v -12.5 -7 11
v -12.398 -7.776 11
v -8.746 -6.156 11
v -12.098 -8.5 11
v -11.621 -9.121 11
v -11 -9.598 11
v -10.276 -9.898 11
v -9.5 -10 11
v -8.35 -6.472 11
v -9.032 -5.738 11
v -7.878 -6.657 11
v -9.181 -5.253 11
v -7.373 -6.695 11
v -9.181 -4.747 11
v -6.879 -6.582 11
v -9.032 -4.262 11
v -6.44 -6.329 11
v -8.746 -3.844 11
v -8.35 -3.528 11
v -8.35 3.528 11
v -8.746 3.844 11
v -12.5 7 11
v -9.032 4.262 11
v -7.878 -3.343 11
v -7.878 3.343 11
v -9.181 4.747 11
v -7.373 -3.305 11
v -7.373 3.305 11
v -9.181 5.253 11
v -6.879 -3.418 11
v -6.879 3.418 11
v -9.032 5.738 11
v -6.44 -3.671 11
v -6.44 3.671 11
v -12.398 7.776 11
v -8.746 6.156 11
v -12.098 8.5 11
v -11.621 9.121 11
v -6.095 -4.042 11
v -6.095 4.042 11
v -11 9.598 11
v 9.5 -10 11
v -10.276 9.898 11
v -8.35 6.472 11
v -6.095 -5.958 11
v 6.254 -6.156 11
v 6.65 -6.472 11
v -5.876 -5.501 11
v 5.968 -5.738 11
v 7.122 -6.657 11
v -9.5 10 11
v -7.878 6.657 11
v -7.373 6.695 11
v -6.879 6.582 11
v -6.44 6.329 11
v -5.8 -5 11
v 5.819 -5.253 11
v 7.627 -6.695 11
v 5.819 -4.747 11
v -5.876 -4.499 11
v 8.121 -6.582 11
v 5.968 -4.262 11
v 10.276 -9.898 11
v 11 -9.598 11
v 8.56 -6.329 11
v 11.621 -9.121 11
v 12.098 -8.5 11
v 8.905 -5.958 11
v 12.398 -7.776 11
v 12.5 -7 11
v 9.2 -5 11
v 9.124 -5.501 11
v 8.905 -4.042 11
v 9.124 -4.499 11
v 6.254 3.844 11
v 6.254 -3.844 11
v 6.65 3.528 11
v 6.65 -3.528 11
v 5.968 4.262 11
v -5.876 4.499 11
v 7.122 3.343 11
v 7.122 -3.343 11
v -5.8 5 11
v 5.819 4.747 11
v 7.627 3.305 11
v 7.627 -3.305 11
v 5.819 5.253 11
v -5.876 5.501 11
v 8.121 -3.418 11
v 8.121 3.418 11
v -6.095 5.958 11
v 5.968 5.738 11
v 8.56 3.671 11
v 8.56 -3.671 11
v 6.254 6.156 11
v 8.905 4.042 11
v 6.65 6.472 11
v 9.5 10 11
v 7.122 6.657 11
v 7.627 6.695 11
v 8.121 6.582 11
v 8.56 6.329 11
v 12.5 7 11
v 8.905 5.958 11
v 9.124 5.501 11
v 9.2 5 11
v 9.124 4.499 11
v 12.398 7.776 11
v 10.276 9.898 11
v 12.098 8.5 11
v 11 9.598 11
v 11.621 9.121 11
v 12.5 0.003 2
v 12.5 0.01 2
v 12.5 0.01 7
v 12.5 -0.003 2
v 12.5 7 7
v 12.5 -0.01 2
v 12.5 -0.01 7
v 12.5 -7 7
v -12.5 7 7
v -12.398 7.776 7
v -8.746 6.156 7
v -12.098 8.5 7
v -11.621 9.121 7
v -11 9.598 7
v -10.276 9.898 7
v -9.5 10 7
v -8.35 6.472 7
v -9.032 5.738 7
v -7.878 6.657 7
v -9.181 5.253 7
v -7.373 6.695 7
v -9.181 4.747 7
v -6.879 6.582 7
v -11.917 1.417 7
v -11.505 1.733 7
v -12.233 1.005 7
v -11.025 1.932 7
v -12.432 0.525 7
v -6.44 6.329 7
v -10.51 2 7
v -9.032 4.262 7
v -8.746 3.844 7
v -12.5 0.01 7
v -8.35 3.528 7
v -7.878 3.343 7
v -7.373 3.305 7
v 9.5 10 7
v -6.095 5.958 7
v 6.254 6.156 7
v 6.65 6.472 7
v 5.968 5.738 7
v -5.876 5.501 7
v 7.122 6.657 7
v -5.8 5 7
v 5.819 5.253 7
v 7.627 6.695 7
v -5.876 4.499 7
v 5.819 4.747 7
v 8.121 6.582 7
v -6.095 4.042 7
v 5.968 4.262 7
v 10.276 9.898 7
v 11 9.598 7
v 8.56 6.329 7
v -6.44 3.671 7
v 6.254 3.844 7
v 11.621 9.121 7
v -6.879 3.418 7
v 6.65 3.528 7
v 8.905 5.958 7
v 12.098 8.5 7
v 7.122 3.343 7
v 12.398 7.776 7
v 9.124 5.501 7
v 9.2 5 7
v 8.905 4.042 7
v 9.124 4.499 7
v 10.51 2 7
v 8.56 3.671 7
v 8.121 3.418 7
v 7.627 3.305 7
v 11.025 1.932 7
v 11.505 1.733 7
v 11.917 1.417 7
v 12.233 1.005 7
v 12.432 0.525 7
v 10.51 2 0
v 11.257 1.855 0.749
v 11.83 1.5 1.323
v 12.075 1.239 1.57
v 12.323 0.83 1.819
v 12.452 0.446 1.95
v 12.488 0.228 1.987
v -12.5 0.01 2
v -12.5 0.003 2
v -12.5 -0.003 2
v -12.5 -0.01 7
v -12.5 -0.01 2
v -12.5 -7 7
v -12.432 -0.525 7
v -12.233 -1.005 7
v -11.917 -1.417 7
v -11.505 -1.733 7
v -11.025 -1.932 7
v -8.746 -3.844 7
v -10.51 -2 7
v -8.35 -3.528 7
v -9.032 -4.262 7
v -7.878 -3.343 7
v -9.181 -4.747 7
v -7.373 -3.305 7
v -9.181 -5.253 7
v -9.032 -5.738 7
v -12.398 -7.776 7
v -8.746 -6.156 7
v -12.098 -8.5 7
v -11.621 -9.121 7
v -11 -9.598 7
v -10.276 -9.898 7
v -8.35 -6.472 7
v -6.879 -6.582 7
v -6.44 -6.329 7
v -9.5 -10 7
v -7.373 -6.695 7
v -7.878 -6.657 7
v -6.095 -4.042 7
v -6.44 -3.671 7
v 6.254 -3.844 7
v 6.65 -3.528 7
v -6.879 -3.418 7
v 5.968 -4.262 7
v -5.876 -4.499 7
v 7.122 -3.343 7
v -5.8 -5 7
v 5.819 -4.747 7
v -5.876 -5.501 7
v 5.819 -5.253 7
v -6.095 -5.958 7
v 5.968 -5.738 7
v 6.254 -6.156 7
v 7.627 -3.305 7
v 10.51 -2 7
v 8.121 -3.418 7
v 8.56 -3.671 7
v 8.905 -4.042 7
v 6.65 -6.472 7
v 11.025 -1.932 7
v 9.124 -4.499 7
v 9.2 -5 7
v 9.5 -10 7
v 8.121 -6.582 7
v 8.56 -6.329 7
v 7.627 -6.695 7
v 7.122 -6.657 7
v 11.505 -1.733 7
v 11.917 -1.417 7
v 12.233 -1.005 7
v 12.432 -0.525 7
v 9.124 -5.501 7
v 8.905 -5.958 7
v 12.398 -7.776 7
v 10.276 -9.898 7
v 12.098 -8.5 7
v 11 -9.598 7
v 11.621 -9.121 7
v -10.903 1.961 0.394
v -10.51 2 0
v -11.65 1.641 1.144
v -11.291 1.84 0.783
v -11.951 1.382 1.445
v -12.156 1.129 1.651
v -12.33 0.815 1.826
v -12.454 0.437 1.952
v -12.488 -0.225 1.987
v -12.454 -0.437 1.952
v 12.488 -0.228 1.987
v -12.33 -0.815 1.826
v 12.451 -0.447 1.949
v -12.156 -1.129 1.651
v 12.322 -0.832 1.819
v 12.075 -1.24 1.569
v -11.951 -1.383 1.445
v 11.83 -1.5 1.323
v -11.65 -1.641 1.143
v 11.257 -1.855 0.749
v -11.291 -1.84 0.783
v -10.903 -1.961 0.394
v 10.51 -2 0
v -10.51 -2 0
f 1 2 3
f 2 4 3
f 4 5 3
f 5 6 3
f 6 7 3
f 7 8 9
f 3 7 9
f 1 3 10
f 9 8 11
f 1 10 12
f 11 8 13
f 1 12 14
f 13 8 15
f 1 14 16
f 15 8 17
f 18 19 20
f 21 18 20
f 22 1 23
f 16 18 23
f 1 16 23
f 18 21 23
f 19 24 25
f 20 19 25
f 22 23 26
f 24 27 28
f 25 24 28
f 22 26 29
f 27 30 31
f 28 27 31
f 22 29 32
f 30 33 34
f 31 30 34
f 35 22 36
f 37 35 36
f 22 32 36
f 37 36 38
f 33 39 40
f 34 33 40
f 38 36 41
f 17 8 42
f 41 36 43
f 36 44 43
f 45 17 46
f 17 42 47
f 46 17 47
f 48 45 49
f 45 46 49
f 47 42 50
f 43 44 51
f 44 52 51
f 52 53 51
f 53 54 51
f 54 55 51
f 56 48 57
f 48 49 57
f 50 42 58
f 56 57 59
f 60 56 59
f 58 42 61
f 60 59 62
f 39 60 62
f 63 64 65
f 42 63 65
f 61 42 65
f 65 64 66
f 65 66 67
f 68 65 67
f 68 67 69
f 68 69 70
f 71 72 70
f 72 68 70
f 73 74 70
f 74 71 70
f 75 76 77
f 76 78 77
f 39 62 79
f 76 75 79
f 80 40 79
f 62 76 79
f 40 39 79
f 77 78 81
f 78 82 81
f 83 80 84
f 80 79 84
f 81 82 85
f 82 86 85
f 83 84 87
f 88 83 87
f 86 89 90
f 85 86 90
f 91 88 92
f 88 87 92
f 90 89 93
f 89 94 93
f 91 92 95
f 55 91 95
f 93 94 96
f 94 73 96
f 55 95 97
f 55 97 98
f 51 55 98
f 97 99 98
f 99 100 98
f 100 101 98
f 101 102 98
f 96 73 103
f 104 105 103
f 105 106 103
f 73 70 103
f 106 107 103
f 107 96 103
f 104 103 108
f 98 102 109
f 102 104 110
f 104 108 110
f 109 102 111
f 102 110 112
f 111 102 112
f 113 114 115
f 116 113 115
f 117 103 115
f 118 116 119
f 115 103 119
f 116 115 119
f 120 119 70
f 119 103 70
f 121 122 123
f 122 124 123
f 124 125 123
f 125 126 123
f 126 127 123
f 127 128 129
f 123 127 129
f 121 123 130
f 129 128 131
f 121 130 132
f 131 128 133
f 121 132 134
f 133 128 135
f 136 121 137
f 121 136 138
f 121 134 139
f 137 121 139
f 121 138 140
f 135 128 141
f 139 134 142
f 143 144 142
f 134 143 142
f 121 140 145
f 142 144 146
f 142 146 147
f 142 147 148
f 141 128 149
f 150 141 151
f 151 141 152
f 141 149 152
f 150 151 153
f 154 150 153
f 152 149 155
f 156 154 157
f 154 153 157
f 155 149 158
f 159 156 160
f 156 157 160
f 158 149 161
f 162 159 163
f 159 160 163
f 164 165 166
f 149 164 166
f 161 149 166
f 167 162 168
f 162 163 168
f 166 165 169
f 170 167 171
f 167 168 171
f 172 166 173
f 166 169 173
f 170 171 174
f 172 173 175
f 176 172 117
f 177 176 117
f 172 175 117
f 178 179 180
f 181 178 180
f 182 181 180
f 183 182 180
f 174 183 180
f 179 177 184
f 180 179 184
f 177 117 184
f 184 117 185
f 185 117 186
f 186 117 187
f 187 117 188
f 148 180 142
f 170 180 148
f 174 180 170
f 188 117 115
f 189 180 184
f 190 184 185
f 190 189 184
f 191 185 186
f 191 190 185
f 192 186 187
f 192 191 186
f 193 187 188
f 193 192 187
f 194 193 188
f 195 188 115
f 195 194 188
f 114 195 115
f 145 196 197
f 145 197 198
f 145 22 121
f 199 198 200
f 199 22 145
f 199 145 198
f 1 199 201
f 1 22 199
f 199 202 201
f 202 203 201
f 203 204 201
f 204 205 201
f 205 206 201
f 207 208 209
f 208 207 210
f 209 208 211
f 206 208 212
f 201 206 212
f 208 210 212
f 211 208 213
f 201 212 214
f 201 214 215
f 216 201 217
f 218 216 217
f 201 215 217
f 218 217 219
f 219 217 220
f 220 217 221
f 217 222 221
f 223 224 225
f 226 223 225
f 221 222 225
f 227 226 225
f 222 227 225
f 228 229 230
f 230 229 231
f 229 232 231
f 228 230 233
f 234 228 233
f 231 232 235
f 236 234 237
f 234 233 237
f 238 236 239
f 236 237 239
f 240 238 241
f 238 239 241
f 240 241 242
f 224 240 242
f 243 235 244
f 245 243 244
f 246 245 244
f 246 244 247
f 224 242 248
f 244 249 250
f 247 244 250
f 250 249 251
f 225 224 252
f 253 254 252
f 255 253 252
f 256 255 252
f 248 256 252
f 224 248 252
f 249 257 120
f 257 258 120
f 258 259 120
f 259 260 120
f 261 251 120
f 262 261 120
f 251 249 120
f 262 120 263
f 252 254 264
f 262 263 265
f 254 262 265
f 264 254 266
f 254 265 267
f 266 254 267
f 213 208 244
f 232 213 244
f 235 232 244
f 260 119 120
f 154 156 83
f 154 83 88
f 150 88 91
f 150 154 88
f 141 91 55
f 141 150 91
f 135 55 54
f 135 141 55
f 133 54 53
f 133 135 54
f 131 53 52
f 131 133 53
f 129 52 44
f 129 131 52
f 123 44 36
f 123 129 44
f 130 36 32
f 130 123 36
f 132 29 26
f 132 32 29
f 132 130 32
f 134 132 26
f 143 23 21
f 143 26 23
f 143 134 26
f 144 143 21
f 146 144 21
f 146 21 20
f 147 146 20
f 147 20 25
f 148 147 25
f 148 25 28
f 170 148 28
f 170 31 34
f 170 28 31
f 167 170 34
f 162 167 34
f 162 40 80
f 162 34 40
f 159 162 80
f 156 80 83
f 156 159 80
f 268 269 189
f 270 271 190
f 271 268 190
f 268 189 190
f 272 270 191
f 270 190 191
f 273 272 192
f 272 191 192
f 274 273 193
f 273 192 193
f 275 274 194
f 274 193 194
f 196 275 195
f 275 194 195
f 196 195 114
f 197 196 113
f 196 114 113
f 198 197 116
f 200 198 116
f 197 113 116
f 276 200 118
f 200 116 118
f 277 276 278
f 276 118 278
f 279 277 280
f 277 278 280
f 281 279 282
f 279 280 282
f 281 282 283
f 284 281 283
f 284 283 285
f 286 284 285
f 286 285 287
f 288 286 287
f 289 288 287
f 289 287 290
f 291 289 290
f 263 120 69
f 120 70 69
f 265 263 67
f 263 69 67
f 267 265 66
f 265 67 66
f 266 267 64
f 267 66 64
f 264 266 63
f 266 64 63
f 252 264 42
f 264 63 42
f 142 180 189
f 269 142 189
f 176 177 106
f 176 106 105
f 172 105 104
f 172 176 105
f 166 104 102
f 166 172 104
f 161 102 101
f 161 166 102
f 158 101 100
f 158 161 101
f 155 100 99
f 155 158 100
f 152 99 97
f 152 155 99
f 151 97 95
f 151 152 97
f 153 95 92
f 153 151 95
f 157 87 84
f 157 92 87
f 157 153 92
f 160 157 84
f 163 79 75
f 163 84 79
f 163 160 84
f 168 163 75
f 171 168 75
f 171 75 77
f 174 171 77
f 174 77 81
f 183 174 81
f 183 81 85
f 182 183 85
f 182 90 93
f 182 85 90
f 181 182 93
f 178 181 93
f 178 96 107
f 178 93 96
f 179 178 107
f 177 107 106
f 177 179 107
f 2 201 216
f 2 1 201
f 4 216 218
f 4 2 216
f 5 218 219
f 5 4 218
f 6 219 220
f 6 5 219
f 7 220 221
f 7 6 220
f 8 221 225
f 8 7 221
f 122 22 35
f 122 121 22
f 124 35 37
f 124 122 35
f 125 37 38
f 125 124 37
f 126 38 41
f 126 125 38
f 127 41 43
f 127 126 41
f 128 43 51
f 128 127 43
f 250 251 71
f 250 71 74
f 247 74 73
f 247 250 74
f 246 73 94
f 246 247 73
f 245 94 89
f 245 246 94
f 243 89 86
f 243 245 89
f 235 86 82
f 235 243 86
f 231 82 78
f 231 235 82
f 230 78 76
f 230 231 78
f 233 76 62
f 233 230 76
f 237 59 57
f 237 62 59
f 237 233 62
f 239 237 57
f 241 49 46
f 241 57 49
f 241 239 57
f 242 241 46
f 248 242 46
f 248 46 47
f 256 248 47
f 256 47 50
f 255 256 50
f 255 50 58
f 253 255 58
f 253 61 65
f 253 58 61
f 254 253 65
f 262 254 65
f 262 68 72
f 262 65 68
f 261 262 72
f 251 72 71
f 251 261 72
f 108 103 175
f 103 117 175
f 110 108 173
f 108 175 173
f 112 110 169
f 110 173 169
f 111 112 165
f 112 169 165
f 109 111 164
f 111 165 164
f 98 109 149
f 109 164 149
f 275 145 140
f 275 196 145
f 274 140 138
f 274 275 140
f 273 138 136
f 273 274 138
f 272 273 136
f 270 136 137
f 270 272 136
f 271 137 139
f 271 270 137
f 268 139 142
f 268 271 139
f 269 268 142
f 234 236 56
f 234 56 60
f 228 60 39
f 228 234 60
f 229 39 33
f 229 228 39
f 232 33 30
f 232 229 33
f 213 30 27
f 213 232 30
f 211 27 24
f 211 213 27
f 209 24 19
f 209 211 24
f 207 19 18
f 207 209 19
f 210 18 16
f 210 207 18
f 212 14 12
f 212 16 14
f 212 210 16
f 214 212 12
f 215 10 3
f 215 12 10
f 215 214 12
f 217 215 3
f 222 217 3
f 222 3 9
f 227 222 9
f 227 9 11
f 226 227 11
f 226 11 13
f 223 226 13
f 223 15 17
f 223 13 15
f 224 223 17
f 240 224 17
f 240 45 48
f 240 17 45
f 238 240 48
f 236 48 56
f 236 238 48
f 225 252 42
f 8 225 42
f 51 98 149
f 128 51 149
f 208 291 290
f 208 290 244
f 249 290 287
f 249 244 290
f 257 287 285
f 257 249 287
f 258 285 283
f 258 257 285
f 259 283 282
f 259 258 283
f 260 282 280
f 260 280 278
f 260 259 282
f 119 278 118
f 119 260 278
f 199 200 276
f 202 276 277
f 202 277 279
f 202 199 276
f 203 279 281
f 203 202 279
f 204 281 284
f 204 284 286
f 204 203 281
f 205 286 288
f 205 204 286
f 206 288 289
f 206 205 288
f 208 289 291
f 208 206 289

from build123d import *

# Parameters (mm, degrees)
PAD_DEPTH         = 12.5
SKETCH001_R       = 1.7
POCKET_DEPTH      = 0.001
POCKET_DEPTH_BACK = -11.001
FILLET_R          = 3
FILLET001_R       = 1.99


with BuildPart() as part:
    # Sketch → Pad (new body, symmetric)
    with BuildSketch(Plane.YZ):
        with BuildLine():
            Line((-2, 0), (-2, 7))
            Line((-2, 7), (-10, 7))
            Line((-10, 7), (-10, 11))
            Line((-10, 11), (10, 11))
            Line((10, 11), (10, 7))
            Line((10, 7), (2, 7))
            Line((2, 7), (2, 0))
            ThreePointArc((2, 0), (0, 2), (-2, 0))
        make_face()
    extrude(amount=PAD_DEPTH, both=True)

    # Sketch001 → Pocket (cut, two sides)
    with BuildSketch(Plane.XY) as pocket_sk:
        with Locations((-7.5, 5)):
            Circle(SKETCH001_R)
        with Locations((-7.5, -5)):
            Circle(SKETCH001_R)
        with Locations((7.5, 5)):
            Circle(SKETCH001_R)
        with Locations((7.5, -5)):
            Circle(SKETCH001_R)
    extrude(amount=-POCKET_DEPTH, mode=Mode.SUBTRACT)
    extrude(pocket_sk.sketch, amount=-POCKET_DEPTH_BACK, mode=Mode.SUBTRACT)

    # Fillet
    fillet_edges = [part.edges().sort_by_distance(p)[0] for p in [
        (12.5, 10, 9),
        (12.5, -10, 9),
        (-12.5, -10, 9),
        (-12.5, 10, 9),
    ]]
    fillet(fillet_edges, radius=FILLET_R)

    # Fillet001
    fillet001_edges = [part.edges().sort_by_distance(p)[0] for p in [
        (-12.5, -2, 3.5),
        (-12.5, 2, 3.5),
        (12.5, -2, 3.5),
        (12.5, 2, 3.5),
    ]]
    fillet(fillet001_edges, radius=FILLET001_R)


solid = part.part
